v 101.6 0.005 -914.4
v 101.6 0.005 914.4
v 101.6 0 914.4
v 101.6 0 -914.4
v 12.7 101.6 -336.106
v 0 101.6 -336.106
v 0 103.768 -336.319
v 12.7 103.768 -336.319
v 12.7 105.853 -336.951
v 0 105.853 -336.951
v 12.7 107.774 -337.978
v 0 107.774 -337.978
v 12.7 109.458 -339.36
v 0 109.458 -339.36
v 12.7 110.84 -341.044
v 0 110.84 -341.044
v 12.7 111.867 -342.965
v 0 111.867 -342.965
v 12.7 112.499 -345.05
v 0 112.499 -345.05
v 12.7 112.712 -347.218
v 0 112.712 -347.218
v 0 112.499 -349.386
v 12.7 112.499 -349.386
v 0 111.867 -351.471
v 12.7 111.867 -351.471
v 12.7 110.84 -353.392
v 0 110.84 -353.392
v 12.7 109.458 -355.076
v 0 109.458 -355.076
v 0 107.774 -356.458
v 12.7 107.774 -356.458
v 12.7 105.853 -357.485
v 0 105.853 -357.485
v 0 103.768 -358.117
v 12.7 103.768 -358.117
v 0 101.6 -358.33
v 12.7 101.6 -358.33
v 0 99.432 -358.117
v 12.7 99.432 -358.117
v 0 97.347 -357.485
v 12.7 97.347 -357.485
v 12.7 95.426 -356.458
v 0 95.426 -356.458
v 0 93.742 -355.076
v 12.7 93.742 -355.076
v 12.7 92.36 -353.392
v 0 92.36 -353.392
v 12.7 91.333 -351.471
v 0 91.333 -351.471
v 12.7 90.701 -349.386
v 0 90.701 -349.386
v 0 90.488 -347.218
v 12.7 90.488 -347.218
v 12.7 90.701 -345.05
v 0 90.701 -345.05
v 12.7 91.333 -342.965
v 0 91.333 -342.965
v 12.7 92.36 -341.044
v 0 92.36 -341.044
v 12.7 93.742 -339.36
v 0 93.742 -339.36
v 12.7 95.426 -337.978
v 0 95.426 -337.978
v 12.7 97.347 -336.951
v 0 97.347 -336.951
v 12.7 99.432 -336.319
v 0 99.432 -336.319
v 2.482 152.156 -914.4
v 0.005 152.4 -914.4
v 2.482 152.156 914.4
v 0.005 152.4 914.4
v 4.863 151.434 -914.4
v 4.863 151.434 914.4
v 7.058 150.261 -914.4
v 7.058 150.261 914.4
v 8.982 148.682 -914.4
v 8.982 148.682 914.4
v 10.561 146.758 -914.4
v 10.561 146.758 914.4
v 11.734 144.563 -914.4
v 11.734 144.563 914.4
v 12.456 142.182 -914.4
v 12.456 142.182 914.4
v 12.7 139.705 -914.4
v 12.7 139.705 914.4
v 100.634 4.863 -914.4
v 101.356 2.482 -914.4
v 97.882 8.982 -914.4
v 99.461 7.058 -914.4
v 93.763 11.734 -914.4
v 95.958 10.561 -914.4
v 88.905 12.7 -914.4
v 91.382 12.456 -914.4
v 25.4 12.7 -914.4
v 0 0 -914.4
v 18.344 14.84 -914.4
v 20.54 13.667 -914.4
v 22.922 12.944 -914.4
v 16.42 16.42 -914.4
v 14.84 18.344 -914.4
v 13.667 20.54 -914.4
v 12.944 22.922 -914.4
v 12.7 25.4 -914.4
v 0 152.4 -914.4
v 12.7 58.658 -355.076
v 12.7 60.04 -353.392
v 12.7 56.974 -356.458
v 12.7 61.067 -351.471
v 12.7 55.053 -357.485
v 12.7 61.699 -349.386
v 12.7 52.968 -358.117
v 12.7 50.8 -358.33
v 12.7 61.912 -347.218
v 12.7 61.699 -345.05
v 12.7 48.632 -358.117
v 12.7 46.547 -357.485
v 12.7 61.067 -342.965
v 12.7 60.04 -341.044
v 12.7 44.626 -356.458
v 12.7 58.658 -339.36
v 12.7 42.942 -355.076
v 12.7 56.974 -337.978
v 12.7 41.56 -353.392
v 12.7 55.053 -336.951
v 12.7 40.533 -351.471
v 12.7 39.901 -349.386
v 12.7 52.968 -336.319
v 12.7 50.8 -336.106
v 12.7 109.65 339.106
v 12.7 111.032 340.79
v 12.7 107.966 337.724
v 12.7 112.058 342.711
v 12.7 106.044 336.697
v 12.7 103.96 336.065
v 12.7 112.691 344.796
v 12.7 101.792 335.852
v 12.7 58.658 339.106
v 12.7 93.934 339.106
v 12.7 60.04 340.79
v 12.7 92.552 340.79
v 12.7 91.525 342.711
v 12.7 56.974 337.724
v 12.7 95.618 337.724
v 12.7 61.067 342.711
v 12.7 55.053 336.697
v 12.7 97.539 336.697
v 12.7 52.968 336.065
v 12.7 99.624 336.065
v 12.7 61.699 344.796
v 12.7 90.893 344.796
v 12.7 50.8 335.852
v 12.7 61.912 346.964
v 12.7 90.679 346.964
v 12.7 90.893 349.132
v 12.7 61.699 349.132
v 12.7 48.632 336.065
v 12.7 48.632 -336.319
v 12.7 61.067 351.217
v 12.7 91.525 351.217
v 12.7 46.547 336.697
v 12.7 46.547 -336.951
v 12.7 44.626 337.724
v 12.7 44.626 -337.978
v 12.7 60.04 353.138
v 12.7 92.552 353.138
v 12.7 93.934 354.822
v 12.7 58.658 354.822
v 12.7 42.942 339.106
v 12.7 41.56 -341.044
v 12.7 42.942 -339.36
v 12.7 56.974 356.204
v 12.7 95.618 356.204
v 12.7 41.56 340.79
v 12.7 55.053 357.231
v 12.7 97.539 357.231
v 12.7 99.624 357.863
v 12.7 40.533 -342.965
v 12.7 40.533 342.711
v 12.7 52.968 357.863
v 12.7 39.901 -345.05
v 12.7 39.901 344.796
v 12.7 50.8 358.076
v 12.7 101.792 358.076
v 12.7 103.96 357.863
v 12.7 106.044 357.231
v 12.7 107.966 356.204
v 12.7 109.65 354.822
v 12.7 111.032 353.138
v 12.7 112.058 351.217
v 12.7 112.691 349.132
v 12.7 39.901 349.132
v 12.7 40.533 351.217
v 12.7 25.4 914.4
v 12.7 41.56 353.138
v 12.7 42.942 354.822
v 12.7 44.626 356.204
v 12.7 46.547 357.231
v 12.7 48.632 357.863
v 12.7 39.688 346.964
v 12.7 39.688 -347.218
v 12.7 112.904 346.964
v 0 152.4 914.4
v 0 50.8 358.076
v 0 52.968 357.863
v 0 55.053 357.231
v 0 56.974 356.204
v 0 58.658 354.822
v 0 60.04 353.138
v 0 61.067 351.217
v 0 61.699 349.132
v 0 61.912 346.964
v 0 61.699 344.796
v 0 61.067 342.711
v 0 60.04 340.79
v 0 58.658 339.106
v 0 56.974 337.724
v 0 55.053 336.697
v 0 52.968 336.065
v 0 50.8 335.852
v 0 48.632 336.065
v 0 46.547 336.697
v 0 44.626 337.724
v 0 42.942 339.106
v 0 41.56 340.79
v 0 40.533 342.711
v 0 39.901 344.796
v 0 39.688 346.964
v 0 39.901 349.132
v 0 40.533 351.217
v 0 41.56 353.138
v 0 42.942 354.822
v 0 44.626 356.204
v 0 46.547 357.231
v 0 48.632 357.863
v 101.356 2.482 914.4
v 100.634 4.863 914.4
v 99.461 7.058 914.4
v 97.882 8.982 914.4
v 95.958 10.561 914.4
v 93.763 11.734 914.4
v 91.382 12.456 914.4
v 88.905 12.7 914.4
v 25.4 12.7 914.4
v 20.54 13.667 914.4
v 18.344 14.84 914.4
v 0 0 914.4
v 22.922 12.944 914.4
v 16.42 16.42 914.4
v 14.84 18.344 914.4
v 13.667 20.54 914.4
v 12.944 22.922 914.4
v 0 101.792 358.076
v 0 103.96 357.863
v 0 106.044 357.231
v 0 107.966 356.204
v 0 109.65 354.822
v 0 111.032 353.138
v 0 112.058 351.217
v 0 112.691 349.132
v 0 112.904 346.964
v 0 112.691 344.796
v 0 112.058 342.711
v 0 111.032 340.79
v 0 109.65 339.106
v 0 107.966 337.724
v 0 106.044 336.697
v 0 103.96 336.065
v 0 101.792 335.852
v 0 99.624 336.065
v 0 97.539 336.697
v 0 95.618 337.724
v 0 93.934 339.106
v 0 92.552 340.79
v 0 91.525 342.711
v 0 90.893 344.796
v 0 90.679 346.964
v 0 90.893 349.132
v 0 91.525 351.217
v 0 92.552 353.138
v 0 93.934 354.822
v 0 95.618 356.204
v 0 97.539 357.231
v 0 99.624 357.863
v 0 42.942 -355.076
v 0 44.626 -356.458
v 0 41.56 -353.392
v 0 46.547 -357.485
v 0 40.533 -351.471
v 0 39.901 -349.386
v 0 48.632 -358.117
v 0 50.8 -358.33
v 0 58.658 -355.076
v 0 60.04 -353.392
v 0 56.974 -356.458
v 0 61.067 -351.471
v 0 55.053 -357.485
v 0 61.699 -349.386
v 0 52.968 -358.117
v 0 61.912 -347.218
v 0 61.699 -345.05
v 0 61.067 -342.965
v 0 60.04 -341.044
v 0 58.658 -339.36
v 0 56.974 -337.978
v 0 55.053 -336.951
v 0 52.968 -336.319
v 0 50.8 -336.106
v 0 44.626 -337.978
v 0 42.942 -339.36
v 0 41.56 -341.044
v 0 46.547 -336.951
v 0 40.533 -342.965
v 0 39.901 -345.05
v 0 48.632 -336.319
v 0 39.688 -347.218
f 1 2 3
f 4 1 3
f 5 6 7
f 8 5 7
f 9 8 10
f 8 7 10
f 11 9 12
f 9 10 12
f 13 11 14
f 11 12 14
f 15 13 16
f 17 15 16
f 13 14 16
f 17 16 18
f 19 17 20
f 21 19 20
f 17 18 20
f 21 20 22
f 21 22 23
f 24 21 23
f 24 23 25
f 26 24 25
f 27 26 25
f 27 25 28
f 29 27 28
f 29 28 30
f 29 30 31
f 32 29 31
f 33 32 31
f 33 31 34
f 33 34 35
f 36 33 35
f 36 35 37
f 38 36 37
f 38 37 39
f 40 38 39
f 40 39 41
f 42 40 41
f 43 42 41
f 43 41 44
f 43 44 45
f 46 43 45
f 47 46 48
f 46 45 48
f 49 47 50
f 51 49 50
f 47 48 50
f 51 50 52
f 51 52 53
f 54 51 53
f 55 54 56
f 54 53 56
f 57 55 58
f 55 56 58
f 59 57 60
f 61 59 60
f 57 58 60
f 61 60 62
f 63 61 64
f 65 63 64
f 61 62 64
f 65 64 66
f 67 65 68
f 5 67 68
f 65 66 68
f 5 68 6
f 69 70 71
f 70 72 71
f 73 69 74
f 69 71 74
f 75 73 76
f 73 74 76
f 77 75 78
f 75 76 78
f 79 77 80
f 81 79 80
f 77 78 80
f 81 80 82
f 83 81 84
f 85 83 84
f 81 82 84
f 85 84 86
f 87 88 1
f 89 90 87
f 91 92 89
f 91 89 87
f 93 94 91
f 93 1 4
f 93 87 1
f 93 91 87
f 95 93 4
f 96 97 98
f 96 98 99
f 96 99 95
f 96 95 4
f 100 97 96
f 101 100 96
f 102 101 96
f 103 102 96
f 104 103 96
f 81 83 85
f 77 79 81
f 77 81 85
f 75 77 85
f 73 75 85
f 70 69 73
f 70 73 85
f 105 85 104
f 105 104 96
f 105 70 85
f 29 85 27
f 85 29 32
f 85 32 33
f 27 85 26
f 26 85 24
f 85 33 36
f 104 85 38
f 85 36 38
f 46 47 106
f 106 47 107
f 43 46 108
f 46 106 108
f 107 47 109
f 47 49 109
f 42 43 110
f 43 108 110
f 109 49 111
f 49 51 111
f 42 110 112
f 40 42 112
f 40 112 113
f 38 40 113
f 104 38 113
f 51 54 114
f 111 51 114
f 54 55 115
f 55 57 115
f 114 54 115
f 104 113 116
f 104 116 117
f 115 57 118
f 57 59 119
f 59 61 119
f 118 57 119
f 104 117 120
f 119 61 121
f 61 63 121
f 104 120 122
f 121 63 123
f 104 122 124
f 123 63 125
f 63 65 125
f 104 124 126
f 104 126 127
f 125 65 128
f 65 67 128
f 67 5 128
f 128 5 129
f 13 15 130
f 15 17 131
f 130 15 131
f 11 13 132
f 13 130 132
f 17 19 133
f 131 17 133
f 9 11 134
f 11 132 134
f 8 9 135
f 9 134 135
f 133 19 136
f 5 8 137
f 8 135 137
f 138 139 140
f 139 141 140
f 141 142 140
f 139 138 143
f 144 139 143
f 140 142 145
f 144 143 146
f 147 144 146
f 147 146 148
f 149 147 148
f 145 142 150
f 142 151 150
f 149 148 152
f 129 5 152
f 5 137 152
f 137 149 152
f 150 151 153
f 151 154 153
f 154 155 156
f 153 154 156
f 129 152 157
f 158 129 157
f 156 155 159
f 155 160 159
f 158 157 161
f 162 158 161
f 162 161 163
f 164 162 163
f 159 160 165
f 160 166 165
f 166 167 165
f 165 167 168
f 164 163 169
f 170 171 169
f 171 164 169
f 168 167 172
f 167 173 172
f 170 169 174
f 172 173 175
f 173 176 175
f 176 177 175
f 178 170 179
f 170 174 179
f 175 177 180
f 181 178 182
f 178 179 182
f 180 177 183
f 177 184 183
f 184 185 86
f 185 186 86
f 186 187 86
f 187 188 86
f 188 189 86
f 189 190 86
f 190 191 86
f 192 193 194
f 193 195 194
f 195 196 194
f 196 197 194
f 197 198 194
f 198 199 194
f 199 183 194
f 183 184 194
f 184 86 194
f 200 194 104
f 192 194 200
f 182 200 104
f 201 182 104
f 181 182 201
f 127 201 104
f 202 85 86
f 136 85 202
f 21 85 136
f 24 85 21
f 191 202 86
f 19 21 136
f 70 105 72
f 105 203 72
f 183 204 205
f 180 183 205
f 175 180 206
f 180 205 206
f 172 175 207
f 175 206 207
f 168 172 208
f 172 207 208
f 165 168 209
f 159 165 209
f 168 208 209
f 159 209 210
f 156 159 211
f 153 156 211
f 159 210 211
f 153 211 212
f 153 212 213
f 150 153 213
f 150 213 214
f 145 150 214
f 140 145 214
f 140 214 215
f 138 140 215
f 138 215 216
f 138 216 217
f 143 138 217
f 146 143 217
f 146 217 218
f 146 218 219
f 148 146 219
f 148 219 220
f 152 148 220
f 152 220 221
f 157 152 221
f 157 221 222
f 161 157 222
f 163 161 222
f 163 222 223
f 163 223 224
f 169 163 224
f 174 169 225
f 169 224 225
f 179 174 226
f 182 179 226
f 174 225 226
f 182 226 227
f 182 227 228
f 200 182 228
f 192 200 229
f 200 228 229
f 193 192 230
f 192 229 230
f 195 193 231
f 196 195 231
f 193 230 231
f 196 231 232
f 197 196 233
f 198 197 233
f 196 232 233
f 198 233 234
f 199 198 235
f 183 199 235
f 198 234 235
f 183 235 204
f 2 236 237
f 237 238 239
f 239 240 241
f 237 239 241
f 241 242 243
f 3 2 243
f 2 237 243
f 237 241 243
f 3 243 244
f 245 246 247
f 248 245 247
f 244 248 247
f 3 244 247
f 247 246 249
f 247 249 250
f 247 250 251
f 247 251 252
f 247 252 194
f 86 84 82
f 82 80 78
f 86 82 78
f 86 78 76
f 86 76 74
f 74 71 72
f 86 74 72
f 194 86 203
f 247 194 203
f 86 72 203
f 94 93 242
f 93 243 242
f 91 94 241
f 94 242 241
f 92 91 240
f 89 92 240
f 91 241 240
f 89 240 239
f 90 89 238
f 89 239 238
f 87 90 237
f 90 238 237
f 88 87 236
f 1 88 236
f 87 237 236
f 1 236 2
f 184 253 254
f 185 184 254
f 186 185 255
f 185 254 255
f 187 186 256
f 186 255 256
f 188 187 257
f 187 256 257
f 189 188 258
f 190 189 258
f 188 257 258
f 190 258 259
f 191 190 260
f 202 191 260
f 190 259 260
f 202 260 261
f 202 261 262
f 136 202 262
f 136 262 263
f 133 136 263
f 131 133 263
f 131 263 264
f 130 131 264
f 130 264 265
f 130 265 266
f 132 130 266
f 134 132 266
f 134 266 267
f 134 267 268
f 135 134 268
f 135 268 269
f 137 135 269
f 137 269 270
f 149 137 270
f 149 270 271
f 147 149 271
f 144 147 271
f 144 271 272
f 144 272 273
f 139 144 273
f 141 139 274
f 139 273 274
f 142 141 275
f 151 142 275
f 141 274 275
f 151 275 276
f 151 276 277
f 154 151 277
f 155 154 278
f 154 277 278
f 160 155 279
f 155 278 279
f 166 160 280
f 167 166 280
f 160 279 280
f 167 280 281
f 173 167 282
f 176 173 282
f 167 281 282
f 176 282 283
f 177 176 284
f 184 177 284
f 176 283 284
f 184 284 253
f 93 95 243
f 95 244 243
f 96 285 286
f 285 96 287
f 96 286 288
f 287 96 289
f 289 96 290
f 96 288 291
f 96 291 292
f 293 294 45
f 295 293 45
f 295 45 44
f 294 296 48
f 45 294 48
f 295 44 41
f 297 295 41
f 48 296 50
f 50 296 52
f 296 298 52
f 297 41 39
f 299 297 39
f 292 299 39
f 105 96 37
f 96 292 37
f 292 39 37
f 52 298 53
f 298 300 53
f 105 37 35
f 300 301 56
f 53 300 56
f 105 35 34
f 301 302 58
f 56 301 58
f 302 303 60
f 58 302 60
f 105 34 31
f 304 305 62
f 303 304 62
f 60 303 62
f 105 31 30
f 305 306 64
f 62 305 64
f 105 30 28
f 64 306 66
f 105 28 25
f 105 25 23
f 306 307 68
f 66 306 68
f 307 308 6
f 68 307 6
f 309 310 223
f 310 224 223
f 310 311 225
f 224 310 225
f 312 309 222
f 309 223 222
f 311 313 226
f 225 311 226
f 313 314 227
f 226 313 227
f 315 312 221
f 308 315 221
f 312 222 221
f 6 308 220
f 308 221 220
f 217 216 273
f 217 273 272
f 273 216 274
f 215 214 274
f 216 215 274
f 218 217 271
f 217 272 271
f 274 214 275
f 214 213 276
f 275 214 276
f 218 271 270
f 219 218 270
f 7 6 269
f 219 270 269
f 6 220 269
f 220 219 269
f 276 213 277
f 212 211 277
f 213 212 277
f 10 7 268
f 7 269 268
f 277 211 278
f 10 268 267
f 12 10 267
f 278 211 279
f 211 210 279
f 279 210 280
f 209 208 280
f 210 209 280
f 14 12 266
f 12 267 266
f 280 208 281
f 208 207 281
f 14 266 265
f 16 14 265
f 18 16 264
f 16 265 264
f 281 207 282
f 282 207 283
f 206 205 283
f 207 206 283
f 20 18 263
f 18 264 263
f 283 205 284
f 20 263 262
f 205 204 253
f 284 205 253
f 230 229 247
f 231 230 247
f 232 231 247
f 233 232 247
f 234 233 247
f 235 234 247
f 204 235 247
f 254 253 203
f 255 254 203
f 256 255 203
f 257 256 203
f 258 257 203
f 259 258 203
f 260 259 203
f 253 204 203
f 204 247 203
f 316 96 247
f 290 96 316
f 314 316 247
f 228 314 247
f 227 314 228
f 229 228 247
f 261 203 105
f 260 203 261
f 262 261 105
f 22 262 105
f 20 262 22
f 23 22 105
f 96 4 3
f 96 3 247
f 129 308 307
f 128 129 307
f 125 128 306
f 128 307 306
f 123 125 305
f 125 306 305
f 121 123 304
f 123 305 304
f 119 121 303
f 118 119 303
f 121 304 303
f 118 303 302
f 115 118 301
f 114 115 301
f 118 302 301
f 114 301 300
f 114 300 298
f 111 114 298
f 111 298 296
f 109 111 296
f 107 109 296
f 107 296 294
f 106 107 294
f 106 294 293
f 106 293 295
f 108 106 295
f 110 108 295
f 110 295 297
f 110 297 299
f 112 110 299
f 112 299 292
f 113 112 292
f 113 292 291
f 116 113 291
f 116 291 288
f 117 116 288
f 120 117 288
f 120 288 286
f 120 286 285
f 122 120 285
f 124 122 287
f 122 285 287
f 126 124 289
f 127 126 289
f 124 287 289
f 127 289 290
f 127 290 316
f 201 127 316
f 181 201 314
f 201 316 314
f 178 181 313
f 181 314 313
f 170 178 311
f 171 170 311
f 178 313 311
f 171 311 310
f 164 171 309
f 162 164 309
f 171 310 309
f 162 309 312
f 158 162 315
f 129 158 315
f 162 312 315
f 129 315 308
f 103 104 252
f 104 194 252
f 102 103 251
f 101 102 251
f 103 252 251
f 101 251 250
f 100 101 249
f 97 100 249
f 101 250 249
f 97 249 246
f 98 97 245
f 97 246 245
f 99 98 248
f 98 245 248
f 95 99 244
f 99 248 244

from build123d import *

# Parameters (mm, degrees)
BOSS_EXTRUDE1_DEPTH = 914.4
CUT_EXTRUDE1_REACH  = 103.6
SKETCH2_R           = 11.1125


with BuildPart() as part:
    # Sketch1 → Boss-Extrude1 (new body, symmetric)
    with BuildSketch(Plane.XY):
        with BuildLine():
            Line((0, 0), (0, 152.4))
            Line((0, 152.4), (0.00508, 152.4))
            ThreePointArc((0.00508, 152.4), (8.981744019, 148.681744019), (12.7, 139.70508))
            Line((12.7, 139.70508), (12.7, 25.4))
            ThreePointArc((12.7, 25.4), (16.419743879, 16.419743879), (25.4, 12.7))
            Line((25.4, 12.7), (88.90508, 12.7))
            ThreePointArc((88.90508, 12.7), (97.881744019, 8.981744019), (101.6, 0.00508))
            Line((101.6, 0.00508), (101.6, 0))
            Line((101.6, 0), (0, 0))
        make_face()
    extrude(amount=BOSS_EXTRUDE1_DEPTH, both=True)

    # Sketch2 → Cut-Extrude1 (cut, up to next)
    with BuildSketch(Plane.ZY, mode=Mode.PRIVATE) as cut_extrude1_sk1:
        with Locations((346.964, 50.8)):
            Circle(SKETCH2_R)
    cut_extrude1_tool1 = extrude(cut_extrude1_sk1.sketch, amount=-CUT_EXTRUDE1_REACH, mode=Mode.PRIVATE) & part.part
    add(cut_extrude1_tool1.solids().sort_by_distance((0, 50.8, 346.964))[0], mode=Mode.SUBTRACT)
    # Sketch2 → Cut-Extrude1 (cut, up to next)
    with BuildSketch(Plane.ZY, mode=Mode.PRIVATE) as cut_extrude1_sk2:
        with Locations((-347.218, 50.8)):
            Circle(SKETCH2_R)
    cut_extrude1_tool2 = extrude(cut_extrude1_sk2.sketch, amount=-CUT_EXTRUDE1_REACH, mode=Mode.PRIVATE) & part.part
    add(cut_extrude1_tool2.solids().sort_by_distance((0, 50.8, -347.218))[0], mode=Mode.SUBTRACT)
    # Sketch2 → Cut-Extrude1 (cut, up to next)
    with BuildSketch(Plane.ZY, mode=Mode.PRIVATE) as cut_extrude1_sk3:
        with Locations((346.964, 101.791886097)):
            Circle(SKETCH2_R)
    cut_extrude1_tool3 = extrude(cut_extrude1_sk3.sketch, amount=-CUT_EXTRUDE1_REACH, mode=Mode.PRIVATE) & part.part
    add(cut_extrude1_tool3.solids().sort_by_distance((0, 101.791886, 346.964))[0], mode=Mode.SUBTRACT)
    # Sketch2 → Cut-Extrude1 (cut, up to next)
    with BuildSketch(Plane.ZY, mode=Mode.PRIVATE) as cut_extrude1_sk4:
        with Locations((-347.218, 101.6)):
            Circle(SKETCH2_R)
    cut_extrude1_tool4 = extrude(cut_extrude1_sk4.sketch, amount=-CUT_EXTRUDE1_REACH, mode=Mode.PRIVATE) & part.part
    add(cut_extrude1_tool4.solids().sort_by_distance((0, 101.6, -347.218))[0], mode=Mode.SUBTRACT)


solid = part.part
